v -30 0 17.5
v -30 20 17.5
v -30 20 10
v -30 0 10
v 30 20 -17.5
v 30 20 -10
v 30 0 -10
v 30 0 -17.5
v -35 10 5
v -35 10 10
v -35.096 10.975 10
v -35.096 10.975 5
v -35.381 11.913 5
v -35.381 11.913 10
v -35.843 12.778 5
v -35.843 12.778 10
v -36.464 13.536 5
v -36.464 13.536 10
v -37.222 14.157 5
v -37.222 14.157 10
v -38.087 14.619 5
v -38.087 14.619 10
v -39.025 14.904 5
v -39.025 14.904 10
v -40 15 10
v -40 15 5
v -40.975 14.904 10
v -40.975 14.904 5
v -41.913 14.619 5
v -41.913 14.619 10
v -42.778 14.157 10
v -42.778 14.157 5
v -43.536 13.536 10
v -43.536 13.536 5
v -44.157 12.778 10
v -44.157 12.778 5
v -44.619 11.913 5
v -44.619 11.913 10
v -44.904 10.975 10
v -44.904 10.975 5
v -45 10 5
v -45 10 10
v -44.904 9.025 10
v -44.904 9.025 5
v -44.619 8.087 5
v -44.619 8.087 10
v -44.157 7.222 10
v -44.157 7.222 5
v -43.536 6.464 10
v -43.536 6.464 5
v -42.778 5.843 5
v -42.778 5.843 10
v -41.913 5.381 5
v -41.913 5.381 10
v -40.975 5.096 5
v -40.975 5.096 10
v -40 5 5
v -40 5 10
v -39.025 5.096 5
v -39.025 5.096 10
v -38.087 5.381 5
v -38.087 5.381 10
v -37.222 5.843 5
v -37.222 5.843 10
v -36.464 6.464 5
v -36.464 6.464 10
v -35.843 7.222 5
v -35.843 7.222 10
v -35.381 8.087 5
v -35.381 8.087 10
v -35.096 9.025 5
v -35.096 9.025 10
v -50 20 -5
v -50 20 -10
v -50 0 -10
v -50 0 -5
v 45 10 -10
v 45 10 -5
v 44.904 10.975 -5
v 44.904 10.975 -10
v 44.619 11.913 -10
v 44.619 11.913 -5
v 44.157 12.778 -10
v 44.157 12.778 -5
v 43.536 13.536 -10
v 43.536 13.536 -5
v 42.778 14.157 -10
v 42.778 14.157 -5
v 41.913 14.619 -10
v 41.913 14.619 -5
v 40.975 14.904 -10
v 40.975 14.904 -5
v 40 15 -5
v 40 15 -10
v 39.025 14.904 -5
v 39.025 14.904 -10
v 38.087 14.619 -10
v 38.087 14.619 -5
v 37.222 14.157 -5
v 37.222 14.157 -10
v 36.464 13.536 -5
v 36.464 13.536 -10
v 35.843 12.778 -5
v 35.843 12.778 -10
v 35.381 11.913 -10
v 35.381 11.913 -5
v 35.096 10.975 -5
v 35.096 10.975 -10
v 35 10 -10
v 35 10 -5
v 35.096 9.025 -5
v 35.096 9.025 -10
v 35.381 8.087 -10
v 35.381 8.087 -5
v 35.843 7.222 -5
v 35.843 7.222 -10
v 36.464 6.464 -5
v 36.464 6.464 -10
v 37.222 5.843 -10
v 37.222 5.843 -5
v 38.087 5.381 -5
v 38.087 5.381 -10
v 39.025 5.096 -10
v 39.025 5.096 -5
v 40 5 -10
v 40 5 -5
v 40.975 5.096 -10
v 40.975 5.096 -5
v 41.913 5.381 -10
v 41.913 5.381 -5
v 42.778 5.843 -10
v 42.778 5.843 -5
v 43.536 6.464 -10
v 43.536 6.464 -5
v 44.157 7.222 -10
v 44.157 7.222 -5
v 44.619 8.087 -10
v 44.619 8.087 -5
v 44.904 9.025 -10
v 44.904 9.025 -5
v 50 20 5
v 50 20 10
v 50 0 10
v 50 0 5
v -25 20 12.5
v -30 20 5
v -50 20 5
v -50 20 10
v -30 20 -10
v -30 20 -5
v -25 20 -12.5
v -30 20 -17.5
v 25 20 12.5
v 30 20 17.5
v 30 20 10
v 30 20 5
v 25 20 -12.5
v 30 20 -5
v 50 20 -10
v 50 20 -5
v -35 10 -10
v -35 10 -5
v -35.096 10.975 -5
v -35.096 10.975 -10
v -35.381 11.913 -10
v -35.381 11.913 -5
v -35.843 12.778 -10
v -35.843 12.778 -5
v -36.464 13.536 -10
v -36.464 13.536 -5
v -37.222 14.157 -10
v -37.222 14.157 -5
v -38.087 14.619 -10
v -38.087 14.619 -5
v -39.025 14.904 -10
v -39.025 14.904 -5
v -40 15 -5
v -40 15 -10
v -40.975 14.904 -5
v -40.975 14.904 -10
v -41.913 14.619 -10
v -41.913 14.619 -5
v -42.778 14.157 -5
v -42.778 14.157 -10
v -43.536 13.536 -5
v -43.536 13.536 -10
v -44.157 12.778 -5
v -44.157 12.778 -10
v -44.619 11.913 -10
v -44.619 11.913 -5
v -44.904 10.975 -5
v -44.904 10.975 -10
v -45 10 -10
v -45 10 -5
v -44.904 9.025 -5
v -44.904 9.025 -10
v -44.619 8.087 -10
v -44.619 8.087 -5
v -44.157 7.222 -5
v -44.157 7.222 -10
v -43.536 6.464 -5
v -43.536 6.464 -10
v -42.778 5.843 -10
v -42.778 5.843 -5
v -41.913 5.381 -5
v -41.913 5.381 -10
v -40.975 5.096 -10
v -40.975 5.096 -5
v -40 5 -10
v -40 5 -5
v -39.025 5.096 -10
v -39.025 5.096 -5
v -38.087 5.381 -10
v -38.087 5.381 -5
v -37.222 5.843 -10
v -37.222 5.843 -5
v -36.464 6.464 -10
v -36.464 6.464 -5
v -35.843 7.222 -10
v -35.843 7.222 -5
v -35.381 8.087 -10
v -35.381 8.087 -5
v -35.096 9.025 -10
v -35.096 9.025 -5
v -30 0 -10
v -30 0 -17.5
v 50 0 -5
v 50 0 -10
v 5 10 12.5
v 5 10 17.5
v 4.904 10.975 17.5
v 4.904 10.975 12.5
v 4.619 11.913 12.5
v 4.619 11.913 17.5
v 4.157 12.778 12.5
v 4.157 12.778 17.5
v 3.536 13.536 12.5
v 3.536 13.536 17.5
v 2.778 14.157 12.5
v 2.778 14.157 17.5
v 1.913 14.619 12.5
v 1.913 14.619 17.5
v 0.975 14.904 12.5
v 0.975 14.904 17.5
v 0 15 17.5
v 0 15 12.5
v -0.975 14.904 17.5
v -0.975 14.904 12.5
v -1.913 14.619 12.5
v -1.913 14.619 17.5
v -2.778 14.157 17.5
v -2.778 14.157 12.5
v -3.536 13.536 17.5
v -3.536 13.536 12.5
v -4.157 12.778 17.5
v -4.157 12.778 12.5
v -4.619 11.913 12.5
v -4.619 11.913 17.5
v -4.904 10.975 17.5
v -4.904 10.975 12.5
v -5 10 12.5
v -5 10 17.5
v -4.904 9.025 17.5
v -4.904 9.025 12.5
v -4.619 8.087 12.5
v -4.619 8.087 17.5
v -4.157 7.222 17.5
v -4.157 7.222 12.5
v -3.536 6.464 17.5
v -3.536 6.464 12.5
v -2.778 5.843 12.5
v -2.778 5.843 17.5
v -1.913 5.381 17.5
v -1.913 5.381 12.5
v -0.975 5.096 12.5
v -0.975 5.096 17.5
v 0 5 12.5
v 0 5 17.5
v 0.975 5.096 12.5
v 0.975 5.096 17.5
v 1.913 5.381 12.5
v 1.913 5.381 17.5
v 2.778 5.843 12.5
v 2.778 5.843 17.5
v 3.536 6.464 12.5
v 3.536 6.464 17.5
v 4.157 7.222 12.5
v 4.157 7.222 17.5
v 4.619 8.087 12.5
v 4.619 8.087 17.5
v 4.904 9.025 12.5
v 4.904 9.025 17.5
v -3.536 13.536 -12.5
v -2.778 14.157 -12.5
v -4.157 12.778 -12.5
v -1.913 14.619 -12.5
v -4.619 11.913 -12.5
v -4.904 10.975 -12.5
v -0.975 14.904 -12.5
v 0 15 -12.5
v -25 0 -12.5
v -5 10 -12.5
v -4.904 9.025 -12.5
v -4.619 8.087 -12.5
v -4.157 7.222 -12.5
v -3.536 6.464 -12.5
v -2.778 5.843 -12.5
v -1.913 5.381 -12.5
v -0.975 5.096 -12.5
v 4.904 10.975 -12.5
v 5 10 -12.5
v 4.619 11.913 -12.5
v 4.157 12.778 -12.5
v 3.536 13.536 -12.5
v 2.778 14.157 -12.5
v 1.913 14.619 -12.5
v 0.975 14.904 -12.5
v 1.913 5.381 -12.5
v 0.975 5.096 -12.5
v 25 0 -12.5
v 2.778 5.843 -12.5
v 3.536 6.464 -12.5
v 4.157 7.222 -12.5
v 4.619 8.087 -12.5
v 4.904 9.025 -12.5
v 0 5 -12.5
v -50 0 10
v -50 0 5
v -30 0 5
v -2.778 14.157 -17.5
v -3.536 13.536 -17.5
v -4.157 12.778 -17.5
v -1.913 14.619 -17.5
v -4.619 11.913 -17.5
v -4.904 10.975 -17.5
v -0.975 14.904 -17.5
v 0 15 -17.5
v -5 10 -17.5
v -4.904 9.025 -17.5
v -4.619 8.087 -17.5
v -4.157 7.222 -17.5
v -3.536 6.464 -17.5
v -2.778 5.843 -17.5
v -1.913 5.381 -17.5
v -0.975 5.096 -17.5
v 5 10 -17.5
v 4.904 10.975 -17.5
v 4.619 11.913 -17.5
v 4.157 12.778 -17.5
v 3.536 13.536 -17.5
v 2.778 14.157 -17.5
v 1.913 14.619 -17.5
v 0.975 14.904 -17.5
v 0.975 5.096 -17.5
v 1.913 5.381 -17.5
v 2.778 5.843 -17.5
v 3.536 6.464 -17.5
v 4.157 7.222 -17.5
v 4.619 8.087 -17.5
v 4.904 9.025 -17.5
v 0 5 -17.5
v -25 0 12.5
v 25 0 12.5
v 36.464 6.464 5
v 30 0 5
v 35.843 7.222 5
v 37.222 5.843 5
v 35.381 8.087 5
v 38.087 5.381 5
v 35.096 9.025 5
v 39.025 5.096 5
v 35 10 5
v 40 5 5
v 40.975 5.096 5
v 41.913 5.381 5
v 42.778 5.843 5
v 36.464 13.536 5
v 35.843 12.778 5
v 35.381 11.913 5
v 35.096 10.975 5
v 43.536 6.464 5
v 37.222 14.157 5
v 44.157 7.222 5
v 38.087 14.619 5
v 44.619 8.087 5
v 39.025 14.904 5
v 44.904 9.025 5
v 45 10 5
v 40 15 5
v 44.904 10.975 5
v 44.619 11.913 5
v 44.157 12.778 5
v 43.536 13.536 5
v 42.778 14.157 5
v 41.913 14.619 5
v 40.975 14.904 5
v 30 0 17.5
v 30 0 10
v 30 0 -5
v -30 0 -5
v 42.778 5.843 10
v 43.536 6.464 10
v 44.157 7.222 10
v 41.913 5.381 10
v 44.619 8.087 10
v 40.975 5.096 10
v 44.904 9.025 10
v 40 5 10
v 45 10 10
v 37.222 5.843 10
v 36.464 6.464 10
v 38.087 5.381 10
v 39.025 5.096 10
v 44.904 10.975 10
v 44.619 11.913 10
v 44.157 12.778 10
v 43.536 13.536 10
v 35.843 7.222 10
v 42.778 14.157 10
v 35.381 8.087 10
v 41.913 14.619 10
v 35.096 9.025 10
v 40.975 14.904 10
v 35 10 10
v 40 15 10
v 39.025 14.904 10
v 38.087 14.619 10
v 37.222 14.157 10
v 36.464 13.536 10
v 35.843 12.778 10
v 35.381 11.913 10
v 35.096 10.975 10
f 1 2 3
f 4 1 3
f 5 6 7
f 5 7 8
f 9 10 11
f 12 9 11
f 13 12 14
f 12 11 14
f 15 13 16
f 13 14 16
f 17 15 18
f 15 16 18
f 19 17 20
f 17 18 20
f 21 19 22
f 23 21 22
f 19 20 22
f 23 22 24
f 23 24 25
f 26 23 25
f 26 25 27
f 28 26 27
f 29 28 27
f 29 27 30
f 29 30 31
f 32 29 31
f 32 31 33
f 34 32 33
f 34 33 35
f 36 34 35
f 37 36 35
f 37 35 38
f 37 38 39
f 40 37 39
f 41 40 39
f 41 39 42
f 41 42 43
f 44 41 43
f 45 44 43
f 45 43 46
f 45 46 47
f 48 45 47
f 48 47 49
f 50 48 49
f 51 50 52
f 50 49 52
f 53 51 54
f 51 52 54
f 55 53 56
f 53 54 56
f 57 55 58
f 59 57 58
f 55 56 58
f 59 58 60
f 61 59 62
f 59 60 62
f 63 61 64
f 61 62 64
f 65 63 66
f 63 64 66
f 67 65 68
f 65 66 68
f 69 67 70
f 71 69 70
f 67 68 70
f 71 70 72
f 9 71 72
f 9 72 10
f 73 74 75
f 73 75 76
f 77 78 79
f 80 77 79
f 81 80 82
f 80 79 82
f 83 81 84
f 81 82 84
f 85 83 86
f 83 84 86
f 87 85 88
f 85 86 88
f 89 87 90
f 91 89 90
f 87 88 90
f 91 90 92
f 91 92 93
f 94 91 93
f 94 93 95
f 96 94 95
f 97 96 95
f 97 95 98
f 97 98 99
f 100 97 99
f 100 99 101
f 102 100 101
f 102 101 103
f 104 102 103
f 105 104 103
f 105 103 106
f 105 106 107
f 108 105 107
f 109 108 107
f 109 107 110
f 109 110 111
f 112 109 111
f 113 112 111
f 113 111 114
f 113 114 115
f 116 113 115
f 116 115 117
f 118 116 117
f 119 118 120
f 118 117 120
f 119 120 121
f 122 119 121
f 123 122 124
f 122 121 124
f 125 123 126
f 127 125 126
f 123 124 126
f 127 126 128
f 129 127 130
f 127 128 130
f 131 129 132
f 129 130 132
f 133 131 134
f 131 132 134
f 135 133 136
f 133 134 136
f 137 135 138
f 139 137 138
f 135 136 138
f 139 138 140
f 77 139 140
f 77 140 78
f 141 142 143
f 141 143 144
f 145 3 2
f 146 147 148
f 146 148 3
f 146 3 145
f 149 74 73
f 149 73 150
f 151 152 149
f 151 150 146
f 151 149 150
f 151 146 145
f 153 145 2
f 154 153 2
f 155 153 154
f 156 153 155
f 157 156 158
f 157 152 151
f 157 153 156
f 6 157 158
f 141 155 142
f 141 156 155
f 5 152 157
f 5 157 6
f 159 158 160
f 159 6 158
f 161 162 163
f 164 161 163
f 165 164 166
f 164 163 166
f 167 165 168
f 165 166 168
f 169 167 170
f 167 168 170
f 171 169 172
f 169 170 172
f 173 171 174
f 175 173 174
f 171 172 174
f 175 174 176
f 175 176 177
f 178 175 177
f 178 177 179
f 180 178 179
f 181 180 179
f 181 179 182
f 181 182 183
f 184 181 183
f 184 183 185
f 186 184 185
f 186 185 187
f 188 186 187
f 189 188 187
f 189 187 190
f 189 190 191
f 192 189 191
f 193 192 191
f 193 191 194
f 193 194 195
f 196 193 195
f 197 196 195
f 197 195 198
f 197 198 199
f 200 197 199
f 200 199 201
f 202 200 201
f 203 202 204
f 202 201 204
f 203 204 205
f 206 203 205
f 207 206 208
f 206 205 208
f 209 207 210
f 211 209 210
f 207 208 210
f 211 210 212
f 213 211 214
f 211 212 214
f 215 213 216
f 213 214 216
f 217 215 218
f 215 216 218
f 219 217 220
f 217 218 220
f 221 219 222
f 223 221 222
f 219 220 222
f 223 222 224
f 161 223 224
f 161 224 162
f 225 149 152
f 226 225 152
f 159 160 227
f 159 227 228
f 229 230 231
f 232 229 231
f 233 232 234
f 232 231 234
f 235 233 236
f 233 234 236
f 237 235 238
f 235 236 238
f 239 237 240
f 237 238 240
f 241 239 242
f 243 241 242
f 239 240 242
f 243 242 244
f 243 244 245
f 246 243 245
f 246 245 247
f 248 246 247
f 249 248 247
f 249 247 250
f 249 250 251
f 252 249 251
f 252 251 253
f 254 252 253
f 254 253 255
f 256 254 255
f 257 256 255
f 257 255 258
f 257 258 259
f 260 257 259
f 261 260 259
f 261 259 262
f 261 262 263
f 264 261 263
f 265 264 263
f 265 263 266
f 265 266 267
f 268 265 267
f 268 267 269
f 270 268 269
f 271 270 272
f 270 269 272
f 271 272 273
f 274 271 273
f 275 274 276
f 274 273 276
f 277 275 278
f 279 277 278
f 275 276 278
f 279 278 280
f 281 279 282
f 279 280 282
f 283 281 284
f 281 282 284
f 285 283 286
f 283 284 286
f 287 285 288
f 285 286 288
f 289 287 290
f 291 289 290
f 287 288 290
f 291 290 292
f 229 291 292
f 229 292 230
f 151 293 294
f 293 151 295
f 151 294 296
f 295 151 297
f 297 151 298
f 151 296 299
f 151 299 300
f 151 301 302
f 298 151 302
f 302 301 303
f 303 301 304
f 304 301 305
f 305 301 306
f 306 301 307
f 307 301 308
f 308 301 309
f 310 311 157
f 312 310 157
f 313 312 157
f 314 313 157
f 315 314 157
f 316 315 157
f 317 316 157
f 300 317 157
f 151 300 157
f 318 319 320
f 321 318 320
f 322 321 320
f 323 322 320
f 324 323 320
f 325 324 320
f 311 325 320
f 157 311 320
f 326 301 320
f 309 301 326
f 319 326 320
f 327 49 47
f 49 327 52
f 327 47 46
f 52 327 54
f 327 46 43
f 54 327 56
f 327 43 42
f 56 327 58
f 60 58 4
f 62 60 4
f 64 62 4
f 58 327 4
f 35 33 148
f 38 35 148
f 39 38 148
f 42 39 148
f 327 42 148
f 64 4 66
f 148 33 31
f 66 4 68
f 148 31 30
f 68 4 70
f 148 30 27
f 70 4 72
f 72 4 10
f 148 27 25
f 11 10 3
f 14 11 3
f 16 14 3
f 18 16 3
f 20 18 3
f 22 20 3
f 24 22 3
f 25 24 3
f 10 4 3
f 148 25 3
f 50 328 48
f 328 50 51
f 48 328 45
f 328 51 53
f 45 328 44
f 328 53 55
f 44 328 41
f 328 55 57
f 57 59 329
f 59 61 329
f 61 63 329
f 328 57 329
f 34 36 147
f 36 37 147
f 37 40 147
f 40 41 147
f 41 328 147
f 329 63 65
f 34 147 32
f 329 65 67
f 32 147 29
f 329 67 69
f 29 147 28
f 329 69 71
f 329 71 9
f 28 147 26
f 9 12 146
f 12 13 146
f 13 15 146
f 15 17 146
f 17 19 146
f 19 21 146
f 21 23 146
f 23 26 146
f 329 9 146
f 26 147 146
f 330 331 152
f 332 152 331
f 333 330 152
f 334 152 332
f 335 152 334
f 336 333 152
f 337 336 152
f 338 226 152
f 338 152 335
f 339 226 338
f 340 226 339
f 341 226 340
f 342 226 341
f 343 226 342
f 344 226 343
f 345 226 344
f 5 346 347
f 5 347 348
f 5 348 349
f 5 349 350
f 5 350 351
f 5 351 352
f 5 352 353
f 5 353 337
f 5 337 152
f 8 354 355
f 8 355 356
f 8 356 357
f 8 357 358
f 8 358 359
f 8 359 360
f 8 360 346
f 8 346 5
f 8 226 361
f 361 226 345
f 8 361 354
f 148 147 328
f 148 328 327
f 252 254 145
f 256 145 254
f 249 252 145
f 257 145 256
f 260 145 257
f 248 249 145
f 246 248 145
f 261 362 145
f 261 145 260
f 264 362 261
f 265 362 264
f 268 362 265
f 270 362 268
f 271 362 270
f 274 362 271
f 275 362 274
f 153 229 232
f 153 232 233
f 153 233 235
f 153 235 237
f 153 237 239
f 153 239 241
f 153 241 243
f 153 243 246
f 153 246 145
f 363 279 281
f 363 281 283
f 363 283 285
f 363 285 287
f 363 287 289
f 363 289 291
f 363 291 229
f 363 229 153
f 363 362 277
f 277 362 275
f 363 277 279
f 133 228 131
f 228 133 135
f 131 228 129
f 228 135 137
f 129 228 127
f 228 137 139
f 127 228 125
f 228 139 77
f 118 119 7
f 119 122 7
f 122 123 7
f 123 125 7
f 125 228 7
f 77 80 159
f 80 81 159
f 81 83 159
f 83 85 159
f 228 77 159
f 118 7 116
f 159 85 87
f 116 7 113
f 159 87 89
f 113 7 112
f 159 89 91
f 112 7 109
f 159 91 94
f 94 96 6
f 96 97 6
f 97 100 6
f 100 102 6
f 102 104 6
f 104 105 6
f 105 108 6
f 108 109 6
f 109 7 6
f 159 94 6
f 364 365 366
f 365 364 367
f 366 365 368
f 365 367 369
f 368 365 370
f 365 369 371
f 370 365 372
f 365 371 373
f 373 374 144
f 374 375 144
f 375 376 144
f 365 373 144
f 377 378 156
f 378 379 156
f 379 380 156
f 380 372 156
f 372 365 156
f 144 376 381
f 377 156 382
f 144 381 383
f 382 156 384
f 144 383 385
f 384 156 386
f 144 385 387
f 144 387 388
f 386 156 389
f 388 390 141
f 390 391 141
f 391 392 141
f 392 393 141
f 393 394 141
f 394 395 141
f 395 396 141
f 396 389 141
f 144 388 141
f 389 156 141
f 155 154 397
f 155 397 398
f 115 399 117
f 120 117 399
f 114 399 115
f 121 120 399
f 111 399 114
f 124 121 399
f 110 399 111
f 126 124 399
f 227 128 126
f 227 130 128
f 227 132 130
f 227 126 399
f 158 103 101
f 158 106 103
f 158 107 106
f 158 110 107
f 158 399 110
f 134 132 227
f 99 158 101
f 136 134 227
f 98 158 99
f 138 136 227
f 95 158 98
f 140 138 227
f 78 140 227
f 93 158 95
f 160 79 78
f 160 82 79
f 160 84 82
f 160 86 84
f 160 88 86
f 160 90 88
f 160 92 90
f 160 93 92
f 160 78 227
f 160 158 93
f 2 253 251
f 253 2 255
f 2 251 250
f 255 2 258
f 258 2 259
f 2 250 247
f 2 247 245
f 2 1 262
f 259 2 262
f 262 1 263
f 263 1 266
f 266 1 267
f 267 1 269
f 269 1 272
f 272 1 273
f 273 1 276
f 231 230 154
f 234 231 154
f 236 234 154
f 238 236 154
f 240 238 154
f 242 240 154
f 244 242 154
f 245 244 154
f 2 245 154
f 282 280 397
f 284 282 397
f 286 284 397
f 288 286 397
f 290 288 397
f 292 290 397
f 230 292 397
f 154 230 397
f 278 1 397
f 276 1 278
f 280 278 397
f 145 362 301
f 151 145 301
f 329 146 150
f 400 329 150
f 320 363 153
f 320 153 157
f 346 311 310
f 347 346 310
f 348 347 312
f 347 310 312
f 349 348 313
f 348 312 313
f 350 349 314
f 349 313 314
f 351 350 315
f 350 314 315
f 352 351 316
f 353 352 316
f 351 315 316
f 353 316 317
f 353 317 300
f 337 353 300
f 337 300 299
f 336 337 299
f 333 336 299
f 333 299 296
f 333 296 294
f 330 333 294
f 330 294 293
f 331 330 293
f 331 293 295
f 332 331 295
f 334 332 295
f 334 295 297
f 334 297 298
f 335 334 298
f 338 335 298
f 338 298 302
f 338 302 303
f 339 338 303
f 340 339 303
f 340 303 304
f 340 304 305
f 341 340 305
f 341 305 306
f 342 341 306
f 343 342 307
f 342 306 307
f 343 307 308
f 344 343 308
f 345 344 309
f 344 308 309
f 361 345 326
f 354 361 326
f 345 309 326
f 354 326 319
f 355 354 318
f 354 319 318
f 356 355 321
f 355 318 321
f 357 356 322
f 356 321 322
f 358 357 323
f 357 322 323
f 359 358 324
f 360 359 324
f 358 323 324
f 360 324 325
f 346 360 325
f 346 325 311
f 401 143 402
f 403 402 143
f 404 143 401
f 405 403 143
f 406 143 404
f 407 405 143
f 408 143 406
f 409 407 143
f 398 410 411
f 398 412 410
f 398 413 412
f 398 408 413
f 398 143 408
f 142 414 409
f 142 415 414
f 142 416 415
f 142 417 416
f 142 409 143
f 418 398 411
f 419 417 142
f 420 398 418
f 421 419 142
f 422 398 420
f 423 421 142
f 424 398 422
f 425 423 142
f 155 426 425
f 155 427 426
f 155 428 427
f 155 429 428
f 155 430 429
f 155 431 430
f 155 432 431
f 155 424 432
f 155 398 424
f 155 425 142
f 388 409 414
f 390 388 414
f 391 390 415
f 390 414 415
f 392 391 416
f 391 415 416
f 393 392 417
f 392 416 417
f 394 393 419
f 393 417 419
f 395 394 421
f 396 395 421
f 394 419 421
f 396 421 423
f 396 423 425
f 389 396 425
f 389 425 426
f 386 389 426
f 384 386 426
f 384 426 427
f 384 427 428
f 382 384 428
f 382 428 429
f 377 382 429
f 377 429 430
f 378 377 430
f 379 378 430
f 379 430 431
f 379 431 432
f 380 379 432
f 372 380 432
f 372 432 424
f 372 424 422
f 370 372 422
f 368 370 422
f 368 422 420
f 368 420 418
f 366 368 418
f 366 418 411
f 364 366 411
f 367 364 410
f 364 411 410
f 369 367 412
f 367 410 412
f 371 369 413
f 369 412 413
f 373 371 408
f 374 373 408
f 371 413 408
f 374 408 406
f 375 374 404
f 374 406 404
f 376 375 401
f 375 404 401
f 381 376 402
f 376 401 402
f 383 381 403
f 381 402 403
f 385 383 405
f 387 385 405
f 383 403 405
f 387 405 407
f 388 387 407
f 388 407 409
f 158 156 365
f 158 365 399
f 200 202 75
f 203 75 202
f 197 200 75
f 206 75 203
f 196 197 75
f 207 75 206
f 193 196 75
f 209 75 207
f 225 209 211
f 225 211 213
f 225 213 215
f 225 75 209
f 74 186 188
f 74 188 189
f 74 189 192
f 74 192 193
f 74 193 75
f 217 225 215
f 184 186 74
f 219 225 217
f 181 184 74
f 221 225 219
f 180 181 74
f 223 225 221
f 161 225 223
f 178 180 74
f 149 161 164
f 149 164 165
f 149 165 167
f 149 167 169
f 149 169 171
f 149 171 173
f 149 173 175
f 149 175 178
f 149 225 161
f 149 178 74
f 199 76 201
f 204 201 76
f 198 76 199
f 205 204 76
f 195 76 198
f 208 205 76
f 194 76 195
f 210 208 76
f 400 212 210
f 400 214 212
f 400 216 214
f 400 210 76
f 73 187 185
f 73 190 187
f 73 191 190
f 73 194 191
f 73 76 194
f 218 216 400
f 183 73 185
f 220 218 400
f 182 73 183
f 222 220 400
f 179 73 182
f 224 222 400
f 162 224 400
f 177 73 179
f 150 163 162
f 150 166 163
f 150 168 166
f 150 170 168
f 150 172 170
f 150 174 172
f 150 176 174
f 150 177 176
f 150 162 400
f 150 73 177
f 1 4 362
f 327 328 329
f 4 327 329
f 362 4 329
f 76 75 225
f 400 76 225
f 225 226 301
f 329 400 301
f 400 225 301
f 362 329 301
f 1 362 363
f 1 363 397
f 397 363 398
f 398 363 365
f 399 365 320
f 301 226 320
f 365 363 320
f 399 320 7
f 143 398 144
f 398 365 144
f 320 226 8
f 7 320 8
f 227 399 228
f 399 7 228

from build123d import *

# Parameters (mm, degrees)
SKETCH2_W           = 60
SKETCH2_H           = 35
SKETCH2_W_2         = 50
SKETCH2_H_2         = 25
BOSS_EXTRUDE1_DEPTH = 20
SKETCH3_R           = 5
CUT_EXTRUDE1_DEPTH  = 36
SKETCH4_W           = 20
SKETCH4_H           = 20
BOSS_EXTRUDE2_DEPTH = 20
SKETCH5_W           = 20
SKETCH5_H           = 20
BOSS_EXTRUDE3_DEPTH = 20
SKETCH6_R           = 5
CUT_EXTRUDE2_DEPTH  = 28.5
SKETCH7_W           = 20
SKETCH7_H           = 10
CUT_EXTRUDE3_DEPTH  = 21


with BuildPart() as part:
    # Sketch2 → Boss-Extrude1 (new body)
    with BuildSketch(Plane(origin=(0, 0, 0), x_dir=(1, 0, 0), z_dir=(0, 1, 0))):
        Rectangle(SKETCH2_W, SKETCH2_H)
        Rectangle(SKETCH2_W_2, SKETCH2_H_2, mode=Mode.SUBTRACT)
    extrude(amount=BOSS_EXTRUDE1_DEPTH)

    # Sketch3 → Cut-Extrude1 (cut, through all)
    with BuildSketch(Plane.XY.offset(17.5)):
        with Locations((0, 10)):
            Circle(SKETCH3_R)
    extrude(amount=-CUT_EXTRUDE1_DEPTH, mode=Mode.SUBTRACT)

    # Sketch4 → Boss-Extrude2 (add)
    with BuildSketch(Plane.ZY.offset(30)):
        with Locations((0, 10)):
            Rectangle(SKETCH4_W, SKETCH4_H)
    extrude(amount=BOSS_EXTRUDE2_DEPTH)

    # Sketch5 → Boss-Extrude3 (add)
    with BuildSketch(Plane(origin=(30, 0, 0), x_dir=(0, 0, -1), z_dir=(1, 0, 0))):
        with Locations((0, 10)):
            Rectangle(SKETCH5_W, SKETCH5_H)
    extrude(amount=BOSS_EXTRUDE3_DEPTH)

    # Sketch6 → Cut-Extrude2 (cut, through all)
    with BuildSketch(Plane.XY.offset(10)):
        with Locations((-40, 10)):
            Circle(SKETCH6_R)
        with Locations((40, 10)):
            Circle(SKETCH6_R)
    extrude(amount=-CUT_EXTRUDE2_DEPTH, mode=Mode.SUBTRACT)

    # Sketch7 → Cut-Extrude3 (cut, through all)
    with BuildSketch(Plane(origin=(0, 20, 0), x_dir=(1, 0, 0), z_dir=(0, 1, 0))):
        with Locations((40, 0)):
            Rectangle(SKETCH7_W, SKETCH7_H)
        with Locations((-40, 0)):
            Rectangle(SKETCH7_W, SKETCH7_H)
    extrude(amount=-CUT_EXTRUDE3_DEPTH, mode=Mode.SUBTRACT)


solid = part.part
